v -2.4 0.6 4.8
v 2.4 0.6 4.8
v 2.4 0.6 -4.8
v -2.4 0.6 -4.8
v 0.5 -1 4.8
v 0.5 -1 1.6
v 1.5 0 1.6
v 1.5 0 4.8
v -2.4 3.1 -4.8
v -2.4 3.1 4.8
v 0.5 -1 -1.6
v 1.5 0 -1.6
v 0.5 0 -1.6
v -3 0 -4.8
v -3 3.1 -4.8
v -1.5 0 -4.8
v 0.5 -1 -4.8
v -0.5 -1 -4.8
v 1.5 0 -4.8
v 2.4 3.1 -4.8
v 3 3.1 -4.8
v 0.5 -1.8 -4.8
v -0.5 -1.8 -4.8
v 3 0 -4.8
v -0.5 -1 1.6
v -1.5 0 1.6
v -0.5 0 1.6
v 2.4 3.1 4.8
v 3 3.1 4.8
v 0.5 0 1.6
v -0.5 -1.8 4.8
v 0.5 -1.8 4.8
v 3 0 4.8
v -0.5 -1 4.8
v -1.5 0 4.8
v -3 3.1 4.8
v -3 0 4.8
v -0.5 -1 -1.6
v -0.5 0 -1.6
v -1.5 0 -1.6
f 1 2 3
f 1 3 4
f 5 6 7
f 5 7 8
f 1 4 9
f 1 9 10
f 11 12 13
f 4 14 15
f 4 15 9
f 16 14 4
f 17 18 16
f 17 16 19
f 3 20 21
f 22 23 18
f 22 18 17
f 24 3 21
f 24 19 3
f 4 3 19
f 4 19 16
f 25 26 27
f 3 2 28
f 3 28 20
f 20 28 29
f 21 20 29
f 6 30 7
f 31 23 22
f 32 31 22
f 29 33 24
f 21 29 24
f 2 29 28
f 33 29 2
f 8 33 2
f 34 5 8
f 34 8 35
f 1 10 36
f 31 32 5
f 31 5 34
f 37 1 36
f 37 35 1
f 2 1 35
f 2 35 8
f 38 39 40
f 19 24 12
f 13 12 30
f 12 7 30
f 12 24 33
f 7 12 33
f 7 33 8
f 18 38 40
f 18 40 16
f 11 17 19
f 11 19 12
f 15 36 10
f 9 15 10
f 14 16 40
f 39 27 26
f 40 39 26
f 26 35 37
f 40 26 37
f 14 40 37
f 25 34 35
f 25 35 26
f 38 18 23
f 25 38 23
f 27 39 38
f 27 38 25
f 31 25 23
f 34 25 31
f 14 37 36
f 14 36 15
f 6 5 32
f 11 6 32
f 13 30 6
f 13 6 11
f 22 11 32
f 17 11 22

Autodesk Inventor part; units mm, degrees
ref_plane "YZ Plane" through (0, 0, 0) normal (1, 0, 0) x (0, 1, 0)
ref_plane "XZ Plane" through (0, 0, 0) normal (0, 1, 0) x (-1, 0, 0)
ref_plane "XY Plane" through (0, 0, 0) normal (0, 0, 1) x (1, 0, 0)
sketch "스케치1" plane through (0, 0, 0) normal (0, 1, 0) x (-1, 0, 0)
  line L0 (-2.4, 4.8) -> (2.4, 4.8)
  line L1 (2.4, 4.8) -> (2.4, -4.8)
  line L2 (2.4, -4.8) -> (-2.4, -4.8)
  line L3 (-2.4, -4.8) -> (-2.4, 4.8)
  line L4 (-2.4, 4.8) -> (2.4, -4.8) construction
  line L5 (2.4, 4.8) -> (-2.4, -4.8) construction
  point P0 (0, 0)
  dimension "d0" = 4.8
  dimension "d1" = 9.6
extrude "돌출1" add sketch "스케치1" along normal blind 0.6
sketch "스케치2" plane through (0, 0, 0) normal (0, -1, 0) x (1, 0, 0)
  line L0 (2.4, -4.8) -> (-2.4, -4.8) projected
  line L1 (2.4, 4.8) -> (2.4, -4.8) projected
  line L2 (-2.4, 4.8) -> (2.4, 4.8) projected
  line L3 (-2.4, -4.8) -> (-2.4, 4.8) projected
  line L4 (2.4, 4.8) -> (3, 4.8)
  line L5 (3, 4.8) -> (3, -4.8)
  line L6 (3, -4.8) -> (2.4, -4.8)
  line L7 (2.4, -4.8) -> (2.4, 4.8)
  line L8 (-2.4, -4.8) -> (-2.4, 4.8) projected
  line L9 (-2.4, 4.8) -> (-3, 4.8)
  line L10 (-3, 4.8) -> (-3, -4.8)
  line L11 (-3, -4.8) -> (-2.4, -4.8)
  line L12 (-2.4, -4.8) -> (-2.4, 4.8)
  point P0 (0, 0)
  dimension "d4" = 0.6
  dimension "d5" = 0.6
extrude "돌출2" add sketch "스케치2" against normal blind 3.1 contours L1 L4 L5 L6 | L11 L10 L9 L3
sketch "스케치3" plane through (0, 0, 0) normal (0, -1, 0) x (1, 0, 0)
  line L0 (2.4, -4.8) -> (-2.4, -4.8) projected
  line L1 (-0.5, 4.8) -> (0.5, 4.8)
  line L2 (0.5, 4.8) -> (0.5, -4.8)
  line L3 (0.5, -4.8) -> (-0.5, -4.8)
  line L4 (-0.5, -4.8) -> (-0.5, 4.8)
  line L5 (-0.5, 4.8) -> (0.5, -4.8) construction
  line L6 (0.5, 4.8) -> (-0.5, -4.8) construction
  point P0 (0, 0)
  dimension "d8" = 1
extrude "돌출3" add sketch "스케치3" along normal blind 1.8
chamfer "모따기1" distance 1 angle 45 2 edges at (-0.5, 0, 0) (0.5, 0, 0)
sketch "스케치4" plane through (0, -1.8, 0) normal (0, -1, 0) x (1, 0, 0)
  line L0 (1.5, 4.8) -> (0.5, 4.8) projected
  line L1 (0.5, 4.8) -> (0.5, -4.8) projected
  line L2 (0.5, -4.8) -> (1.5, -4.8) projected
  line L3 (1.5, -4.8) -> (1.5, 4.8) projected
  line L4 (-0.5, 4.8) -> (-0.5, -4.8) projected
  line L5 (-0.5, -4.8) -> (0.5, -4.8) projected
  line L6 (0.5, -4.8) -> (0.5, 4.8) projected
  line L7 (0.5, 4.8) -> (-0.5, 4.8) projected
  line L8 (-1.5, -4.8) -> (-0.5, -4.8) projected
  line L9 (-0.5, -4.8) -> (-0.5, 4.8) projected
  line L10 (-0.5, 4.8) -> (-1.5, 4.8) projected
  line L11 (-1.5, 4.8) -> (-1.5, -4.8) projected
  line L12 (-1.5, 1.6) -> (1.5, 1.6)
  line L13 (1.5, 1.6) -> (1.5, -1.6)
  line L14 (1.5, -1.6) -> (-1.5, -1.6)
  line L15 (-1.5, -1.6) -> (-1.5, 1.6)
  line L16 (-1.5, 1.6) -> (1.5, -1.6) construction
  line L17 (1.5, 1.6) -> (-1.5, -1.6) construction
  point P0 (0, 0)
  point P1 (-0.5, -1.6)
  point P2 (-0.5, 1.6)
  point P3 (0.5, -1.6)
  point P4 (0.5, 1.6)
  dimension "d14" = 3.2
extrude "돌출4" cut sketch "스케치4" against normal up to surface (1.8 mm away) contours L3 L14 L1 L12 | L4 L14 L11 L12
properties part number "endcap_4mm_2ea_typeB_ver2_onyx_addon"
